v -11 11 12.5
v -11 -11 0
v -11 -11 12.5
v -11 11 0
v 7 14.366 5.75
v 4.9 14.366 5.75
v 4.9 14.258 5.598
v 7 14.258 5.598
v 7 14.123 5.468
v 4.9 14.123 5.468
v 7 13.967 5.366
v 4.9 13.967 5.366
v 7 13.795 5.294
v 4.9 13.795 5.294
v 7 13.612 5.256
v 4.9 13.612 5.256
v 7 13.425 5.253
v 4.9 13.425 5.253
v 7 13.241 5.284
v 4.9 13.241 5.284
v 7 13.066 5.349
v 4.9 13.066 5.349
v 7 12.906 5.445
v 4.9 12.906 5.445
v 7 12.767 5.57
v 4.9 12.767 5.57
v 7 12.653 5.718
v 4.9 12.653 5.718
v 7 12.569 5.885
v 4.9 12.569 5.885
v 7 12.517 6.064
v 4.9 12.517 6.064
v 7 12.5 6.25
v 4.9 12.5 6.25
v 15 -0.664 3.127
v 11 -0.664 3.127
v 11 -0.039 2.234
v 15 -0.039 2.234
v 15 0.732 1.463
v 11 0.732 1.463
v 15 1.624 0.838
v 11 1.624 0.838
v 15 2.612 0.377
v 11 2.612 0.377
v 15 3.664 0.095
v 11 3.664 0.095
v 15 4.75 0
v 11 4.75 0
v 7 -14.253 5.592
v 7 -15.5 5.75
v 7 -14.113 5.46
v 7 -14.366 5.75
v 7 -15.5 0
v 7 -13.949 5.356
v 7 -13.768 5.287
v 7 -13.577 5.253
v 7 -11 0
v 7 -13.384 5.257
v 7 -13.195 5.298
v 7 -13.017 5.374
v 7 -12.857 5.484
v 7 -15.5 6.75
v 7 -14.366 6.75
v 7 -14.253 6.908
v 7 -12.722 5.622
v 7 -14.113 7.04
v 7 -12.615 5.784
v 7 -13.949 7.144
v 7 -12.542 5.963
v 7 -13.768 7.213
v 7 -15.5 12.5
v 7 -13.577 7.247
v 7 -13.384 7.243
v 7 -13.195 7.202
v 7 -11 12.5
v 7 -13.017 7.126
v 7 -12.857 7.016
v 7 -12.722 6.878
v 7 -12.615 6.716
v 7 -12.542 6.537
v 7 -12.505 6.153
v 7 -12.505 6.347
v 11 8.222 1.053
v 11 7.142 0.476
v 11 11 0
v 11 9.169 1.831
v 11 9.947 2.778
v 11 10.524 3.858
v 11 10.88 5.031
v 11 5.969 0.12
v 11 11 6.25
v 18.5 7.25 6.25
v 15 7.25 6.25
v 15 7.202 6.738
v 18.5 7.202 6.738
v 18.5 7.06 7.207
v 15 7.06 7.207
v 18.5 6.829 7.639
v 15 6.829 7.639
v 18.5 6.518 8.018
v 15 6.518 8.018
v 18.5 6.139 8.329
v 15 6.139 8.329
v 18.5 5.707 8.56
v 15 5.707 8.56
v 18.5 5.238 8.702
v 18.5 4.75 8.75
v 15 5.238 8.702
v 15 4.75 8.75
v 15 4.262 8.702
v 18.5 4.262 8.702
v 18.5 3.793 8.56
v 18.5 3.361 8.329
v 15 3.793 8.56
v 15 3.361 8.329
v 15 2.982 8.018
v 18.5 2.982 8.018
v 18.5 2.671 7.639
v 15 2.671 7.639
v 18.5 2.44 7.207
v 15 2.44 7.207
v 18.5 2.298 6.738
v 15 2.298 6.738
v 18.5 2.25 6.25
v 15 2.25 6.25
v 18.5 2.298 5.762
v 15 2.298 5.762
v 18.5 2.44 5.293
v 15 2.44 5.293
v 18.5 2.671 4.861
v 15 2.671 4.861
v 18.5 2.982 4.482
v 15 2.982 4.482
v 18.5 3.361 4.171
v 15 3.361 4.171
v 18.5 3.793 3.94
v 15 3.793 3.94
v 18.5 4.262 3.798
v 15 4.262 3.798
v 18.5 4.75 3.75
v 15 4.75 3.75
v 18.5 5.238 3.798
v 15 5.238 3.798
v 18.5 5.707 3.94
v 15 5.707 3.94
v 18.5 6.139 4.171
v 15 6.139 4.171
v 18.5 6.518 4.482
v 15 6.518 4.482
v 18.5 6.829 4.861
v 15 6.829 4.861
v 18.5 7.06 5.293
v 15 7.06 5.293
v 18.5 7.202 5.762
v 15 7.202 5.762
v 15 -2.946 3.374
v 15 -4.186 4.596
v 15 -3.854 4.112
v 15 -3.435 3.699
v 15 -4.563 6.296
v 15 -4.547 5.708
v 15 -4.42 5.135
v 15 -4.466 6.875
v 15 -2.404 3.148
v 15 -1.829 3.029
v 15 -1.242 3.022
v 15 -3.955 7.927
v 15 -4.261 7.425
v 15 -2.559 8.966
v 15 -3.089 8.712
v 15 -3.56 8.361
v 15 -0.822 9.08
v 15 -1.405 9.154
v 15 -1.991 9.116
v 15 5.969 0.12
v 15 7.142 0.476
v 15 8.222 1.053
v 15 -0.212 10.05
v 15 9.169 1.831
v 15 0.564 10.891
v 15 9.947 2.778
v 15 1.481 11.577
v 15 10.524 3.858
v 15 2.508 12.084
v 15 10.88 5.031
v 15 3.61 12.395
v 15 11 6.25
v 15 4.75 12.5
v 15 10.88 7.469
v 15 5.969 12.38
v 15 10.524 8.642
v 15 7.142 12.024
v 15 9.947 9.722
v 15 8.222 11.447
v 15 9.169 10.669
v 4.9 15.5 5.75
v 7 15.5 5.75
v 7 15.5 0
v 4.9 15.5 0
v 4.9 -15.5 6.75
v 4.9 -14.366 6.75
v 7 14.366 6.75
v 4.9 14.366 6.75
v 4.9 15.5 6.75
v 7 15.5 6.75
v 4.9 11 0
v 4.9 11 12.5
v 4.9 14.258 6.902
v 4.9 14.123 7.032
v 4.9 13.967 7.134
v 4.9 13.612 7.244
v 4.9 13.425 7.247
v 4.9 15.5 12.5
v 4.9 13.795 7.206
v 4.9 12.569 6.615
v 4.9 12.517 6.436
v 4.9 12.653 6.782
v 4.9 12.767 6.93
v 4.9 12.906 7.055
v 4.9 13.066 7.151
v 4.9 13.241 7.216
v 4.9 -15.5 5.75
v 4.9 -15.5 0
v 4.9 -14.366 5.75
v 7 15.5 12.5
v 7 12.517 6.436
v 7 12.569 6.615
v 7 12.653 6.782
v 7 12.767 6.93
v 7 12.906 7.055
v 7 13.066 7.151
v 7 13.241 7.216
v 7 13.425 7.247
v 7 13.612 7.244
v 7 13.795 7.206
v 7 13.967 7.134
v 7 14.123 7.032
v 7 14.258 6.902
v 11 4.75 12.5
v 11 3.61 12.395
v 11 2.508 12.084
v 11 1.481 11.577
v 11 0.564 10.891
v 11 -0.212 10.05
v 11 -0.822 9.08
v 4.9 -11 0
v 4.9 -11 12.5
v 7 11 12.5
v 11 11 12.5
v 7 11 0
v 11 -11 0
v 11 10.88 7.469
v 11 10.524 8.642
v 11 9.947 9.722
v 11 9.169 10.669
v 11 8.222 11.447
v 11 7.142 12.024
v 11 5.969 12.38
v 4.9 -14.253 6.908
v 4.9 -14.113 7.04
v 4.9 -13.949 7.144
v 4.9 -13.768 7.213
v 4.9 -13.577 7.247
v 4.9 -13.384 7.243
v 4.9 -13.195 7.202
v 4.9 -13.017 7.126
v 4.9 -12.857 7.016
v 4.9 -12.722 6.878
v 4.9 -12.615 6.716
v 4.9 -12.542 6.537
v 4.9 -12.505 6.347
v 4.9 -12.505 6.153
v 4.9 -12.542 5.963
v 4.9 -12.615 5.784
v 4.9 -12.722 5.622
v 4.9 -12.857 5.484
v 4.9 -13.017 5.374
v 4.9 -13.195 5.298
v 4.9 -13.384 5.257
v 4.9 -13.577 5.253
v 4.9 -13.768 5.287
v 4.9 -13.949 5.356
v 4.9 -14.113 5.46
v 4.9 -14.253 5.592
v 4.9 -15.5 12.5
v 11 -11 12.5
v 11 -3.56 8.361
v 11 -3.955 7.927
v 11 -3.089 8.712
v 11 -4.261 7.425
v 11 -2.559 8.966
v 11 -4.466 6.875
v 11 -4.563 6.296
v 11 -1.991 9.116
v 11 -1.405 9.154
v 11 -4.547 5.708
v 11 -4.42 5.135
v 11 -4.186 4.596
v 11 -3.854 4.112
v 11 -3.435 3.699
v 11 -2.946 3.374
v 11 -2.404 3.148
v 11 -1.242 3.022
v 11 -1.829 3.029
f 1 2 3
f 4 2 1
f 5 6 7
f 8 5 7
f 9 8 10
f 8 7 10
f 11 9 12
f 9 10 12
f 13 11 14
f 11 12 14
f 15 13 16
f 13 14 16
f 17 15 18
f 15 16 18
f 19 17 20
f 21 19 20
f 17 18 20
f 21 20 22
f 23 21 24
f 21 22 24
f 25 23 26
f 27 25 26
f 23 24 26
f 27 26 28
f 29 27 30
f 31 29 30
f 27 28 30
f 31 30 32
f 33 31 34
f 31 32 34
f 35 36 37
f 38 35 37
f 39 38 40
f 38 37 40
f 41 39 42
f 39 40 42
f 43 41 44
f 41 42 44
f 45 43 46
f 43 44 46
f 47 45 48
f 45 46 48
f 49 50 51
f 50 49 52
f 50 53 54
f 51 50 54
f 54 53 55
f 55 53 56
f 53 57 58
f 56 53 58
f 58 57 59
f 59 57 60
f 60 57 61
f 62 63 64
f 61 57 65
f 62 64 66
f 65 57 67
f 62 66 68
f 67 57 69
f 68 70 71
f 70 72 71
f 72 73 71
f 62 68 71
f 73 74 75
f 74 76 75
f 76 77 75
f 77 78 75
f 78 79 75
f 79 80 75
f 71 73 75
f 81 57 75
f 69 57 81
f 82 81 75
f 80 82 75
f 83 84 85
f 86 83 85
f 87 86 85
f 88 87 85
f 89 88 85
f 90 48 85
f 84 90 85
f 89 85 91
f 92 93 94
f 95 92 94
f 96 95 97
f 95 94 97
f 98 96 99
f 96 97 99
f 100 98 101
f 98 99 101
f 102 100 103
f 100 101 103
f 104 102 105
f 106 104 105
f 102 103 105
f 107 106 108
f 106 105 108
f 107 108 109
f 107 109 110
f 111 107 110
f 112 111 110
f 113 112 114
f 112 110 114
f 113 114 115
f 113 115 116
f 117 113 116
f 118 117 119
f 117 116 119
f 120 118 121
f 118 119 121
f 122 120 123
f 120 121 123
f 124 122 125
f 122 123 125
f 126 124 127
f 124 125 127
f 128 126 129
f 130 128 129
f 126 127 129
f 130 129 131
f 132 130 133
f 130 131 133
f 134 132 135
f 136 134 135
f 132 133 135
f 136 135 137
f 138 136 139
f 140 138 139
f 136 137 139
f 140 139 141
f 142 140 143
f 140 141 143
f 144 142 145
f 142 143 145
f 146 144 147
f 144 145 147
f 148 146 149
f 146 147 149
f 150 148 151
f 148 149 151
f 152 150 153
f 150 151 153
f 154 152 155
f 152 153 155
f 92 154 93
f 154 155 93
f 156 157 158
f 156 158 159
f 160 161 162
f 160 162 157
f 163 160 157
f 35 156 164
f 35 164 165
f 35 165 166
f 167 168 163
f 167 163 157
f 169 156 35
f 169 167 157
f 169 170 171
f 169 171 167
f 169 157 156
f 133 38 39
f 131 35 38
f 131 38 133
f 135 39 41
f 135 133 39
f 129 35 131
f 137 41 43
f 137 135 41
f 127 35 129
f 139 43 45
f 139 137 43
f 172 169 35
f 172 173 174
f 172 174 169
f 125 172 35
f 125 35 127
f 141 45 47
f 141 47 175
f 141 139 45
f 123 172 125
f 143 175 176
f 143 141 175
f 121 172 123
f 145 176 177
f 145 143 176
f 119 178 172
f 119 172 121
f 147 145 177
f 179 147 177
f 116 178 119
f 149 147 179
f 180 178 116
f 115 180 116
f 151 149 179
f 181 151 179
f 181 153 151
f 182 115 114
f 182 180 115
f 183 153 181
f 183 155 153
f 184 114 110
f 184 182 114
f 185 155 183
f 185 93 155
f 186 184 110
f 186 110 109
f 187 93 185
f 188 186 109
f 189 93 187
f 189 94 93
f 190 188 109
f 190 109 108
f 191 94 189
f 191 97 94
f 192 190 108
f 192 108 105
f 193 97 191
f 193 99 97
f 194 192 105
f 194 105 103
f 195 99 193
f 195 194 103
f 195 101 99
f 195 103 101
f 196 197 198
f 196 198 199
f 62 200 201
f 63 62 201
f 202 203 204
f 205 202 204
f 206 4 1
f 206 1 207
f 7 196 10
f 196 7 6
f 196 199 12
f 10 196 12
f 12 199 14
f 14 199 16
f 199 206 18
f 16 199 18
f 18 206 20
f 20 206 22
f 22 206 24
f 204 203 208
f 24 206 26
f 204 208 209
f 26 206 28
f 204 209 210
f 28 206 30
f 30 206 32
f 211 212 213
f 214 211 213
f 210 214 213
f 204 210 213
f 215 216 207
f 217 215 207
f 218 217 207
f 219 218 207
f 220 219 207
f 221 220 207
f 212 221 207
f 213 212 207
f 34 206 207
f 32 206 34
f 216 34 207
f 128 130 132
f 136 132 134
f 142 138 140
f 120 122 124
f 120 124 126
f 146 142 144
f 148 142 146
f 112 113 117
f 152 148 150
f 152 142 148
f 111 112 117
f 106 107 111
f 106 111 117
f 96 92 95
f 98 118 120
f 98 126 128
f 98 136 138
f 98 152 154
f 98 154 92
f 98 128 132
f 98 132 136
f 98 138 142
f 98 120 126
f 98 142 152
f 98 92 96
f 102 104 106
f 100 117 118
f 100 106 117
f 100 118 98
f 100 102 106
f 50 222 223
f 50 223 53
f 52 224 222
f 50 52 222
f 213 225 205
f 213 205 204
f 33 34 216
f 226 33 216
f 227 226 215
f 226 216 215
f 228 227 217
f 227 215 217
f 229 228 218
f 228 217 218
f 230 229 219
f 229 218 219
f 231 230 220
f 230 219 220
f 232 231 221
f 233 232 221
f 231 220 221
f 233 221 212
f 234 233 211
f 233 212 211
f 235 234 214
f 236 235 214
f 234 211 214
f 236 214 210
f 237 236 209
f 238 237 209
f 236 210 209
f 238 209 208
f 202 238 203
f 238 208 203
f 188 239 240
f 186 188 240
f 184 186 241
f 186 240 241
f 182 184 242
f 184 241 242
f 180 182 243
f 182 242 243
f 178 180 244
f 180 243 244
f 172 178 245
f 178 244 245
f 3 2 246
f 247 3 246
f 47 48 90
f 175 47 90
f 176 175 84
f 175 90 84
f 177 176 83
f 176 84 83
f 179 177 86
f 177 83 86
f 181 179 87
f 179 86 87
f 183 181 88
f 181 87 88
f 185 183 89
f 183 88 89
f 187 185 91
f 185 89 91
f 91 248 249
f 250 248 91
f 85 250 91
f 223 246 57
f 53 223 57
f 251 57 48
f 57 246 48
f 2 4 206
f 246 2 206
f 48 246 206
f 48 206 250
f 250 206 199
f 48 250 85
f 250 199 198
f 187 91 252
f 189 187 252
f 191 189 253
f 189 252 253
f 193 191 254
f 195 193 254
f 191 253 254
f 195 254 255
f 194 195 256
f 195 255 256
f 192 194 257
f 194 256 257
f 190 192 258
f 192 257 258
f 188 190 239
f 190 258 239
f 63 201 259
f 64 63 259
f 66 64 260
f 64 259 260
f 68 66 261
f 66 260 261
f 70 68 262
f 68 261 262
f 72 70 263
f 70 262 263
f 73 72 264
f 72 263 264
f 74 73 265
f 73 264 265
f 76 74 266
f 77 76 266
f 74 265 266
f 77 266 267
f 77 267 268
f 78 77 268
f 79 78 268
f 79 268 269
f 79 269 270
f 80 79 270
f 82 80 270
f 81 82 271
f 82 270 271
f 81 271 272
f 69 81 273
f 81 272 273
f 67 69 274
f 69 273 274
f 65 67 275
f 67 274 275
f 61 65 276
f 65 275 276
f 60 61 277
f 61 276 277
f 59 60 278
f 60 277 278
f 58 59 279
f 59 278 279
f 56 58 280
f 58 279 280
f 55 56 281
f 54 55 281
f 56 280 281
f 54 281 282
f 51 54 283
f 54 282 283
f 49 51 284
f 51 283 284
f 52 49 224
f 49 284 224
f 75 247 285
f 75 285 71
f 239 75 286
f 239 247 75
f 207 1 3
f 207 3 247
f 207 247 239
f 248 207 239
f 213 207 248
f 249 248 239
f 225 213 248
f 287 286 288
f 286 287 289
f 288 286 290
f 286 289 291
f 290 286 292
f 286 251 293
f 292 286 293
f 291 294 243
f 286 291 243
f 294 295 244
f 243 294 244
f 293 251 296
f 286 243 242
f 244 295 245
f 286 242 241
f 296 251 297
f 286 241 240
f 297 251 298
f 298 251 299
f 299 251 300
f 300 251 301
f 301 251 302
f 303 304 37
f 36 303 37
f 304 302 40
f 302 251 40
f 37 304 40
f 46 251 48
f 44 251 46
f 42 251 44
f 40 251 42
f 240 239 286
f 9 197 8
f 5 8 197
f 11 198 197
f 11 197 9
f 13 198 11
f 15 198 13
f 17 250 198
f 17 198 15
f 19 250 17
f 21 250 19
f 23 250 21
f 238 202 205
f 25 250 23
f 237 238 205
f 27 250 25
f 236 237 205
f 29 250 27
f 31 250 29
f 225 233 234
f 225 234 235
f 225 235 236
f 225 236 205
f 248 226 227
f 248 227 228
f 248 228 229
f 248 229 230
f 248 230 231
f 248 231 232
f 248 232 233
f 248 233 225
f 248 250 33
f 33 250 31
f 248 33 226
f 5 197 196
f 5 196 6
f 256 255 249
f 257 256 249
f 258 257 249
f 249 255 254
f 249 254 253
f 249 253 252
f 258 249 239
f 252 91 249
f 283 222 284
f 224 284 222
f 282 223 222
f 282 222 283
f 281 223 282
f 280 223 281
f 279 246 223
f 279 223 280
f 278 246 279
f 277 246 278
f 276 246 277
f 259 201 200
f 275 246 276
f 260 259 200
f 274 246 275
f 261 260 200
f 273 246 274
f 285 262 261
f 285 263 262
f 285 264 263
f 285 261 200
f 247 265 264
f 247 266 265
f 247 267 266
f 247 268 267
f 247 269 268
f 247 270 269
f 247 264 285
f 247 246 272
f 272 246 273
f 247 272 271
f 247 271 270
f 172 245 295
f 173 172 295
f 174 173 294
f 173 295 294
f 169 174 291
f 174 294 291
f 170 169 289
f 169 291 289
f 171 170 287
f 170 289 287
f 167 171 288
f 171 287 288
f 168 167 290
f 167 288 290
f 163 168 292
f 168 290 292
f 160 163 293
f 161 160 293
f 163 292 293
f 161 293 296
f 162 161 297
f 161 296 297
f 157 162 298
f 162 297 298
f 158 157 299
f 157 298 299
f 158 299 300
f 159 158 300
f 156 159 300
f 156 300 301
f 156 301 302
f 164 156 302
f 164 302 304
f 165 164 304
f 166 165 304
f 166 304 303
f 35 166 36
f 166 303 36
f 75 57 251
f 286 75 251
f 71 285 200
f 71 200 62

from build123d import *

# Parameters (mm, degrees)
F0_W      = 22
F0_H      = 22
F1_DEPTH  = 12.5
F3_DEPTH  = 4
F4_R      = 2.5
F5_DEPTH  = 3.5
F6_W      = 2.1
F6_H      = 12.5
F7_DEPTH  = 4.5
F9_DEPTH  = 2.1
F10_W     = 2.1
F10_H     = 12.5
F11_DEPTH = 4.5
F13_DEPTH = 2.1


with BuildPart() as f1:
    # F0 (on Top) → F1 (new body)
    with BuildSketch(Plane.XY):
        Rectangle(F0_W, F0_H)
    extrude(amount=F1_DEPTH)

    # F2 (on face) → F3 (join)
    with BuildSketch(Plane.YZ.offset(11)):
        with BuildLine():
            ThreePointArc((-0.6636140703, 3.1266552068), (1.6241725062, 0.8378190645), (4.75, 0))
            ThreePointArc((4.75, 0), (9.1694173824, 1.8305826176), (11, 6.25))
            ThreePointArc((11, 6.25), (9.1694173824, 10.6694173824), (4.75, 12.5))
            ThreePointArc((4.75, 12.5), (1.4810489541, 11.5769558905), (-0.8223385695, 9.0804668991))
            ThreePointArc((-0.8223385695, 9.0804668991), (0.9015416929, 8.0022024538), (1.5744178172, 6.0834385042))
            ThreePointArc((1.5744178172, 6.0834385042), (0.9518242766, 4.2292975847), (-0.6636140703, 3.1266552068))
        make_face()
        with BuildLine():
            ThreePointArc((-0.8223385695, 9.0804668991), (-4.568887039, 6.001564921), (-0.6636140703, 3.1266552068))
            ThreePointArc((-0.6636140703, 3.1266552068), (-1.4977801872, 6.0834385042), (-0.8223385695, 9.0804668991))
        make_face()
        with BuildLine():
            ThreePointArc((-0.8223385695, 9.0804668991), (-1.4977801872, 6.0834385042), (-0.6636140703, 3.1266552068))
            ThreePointArc((-0.6636140703, 3.1266552068), (0.9518242766, 4.2292975847), (1.5744178172, 6.0834385042))
            ThreePointArc((1.5744178172, 6.0834385042), (0.9015416929, 8.0022024538), (-0.8223385695, 9.0804668991))
        make_face()
    extrude(amount=F3_DEPTH)

    # F4 (on face) → F5 (join)
    with BuildSketch(Plane.YZ.offset(15)):
        with Locations((4.75, 6.25)):
            Circle(F4_R)
    extrude(amount=F5_DEPTH)

    # F6 (on face) → F7 (join)
    with BuildSketch(Plane.XZ.offset(11)):
        with Locations((5.95, 6.25)):
            Rectangle(F6_W, F6_H)
    extrude(amount=F7_DEPTH)

    # F8 (on face) → F9 (cut)
    with BuildSketch(Plane(origin=(4.9, 0, 0), x_dir=(0, -1, 0), z_dir=(-1, 0, 0))):
        with BuildLine():
            ThreePointArc((14.3660254038, 6.75), (14.4659258263, 6.5088190451), (14.5, 6.25))
            ThreePointArc((14.5, 6.25), (14.4659258263, 5.9911809549), (14.3660254038, 5.75))
            Line((14.3660254038, 5.75), (15.5, 5.75))
            Line((15.5, 5.75), (15.5, 6.75))
            Line((15.5, 6.75), (14.3660254038, 6.75))
        make_face()
        with BuildLine():
            ThreePointArc((14.3660254038, 5.75), (14.4659258263, 5.9911809549), (14.5, 6.25))
            ThreePointArc((14.5, 6.25), (14.4659258263, 6.5088190451), (14.3660254038, 6.75))
            ThreePointArc((14.3660254038, 6.75), (12.5, 6.25), (14.3660254038, 5.75))
        make_face()
    extrude(amount=-F9_DEPTH, mode=Mode.SUBTRACT)

    # F10 (on face) → F11 (join)
    with BuildSketch(Plane(origin=(0, 11, 0), x_dir=(-1, 0, 0), z_dir=(0, 1, 0))):
        with Locations((-5.95, 6.25)):
            Rectangle(F10_W, F10_H)
    extrude(amount=F11_DEPTH)

    # F12 (on face) → F13 (cut)
    with BuildSketch(Plane(origin=(4.9, 0, 0), x_dir=(0, -1, 0), z_dir=(-1, 0, 0))):
        with BuildLine():
            ThreePointArc((-14.3660254038, 5.75), (-13.2411809549, 5.2840741737), (-12.5, 6.25))
            ThreePointArc((-12.5, 6.25), (-13.2411809549, 7.2159258263), (-14.3660254038, 6.75))
            ThreePointArc((-14.3660254038, 6.75), (-14.5, 6.25), (-14.3660254038, 5.75))
        make_face()
        with BuildLine():
            ThreePointArc((-14.3660254038, 5.75), (-14.5, 6.25), (-14.3660254038, 6.75))
            Line((-14.3660254038, 6.75), (-15.5, 6.75))
            Line((-15.5, 6.75), (-15.5, 5.75))
            Line((-15.5, 5.75), (-14.3660254038, 5.75))
        make_face()
    extrude(amount=-F13_DEPTH, mode=Mode.SUBTRACT)


solid = f1.part
